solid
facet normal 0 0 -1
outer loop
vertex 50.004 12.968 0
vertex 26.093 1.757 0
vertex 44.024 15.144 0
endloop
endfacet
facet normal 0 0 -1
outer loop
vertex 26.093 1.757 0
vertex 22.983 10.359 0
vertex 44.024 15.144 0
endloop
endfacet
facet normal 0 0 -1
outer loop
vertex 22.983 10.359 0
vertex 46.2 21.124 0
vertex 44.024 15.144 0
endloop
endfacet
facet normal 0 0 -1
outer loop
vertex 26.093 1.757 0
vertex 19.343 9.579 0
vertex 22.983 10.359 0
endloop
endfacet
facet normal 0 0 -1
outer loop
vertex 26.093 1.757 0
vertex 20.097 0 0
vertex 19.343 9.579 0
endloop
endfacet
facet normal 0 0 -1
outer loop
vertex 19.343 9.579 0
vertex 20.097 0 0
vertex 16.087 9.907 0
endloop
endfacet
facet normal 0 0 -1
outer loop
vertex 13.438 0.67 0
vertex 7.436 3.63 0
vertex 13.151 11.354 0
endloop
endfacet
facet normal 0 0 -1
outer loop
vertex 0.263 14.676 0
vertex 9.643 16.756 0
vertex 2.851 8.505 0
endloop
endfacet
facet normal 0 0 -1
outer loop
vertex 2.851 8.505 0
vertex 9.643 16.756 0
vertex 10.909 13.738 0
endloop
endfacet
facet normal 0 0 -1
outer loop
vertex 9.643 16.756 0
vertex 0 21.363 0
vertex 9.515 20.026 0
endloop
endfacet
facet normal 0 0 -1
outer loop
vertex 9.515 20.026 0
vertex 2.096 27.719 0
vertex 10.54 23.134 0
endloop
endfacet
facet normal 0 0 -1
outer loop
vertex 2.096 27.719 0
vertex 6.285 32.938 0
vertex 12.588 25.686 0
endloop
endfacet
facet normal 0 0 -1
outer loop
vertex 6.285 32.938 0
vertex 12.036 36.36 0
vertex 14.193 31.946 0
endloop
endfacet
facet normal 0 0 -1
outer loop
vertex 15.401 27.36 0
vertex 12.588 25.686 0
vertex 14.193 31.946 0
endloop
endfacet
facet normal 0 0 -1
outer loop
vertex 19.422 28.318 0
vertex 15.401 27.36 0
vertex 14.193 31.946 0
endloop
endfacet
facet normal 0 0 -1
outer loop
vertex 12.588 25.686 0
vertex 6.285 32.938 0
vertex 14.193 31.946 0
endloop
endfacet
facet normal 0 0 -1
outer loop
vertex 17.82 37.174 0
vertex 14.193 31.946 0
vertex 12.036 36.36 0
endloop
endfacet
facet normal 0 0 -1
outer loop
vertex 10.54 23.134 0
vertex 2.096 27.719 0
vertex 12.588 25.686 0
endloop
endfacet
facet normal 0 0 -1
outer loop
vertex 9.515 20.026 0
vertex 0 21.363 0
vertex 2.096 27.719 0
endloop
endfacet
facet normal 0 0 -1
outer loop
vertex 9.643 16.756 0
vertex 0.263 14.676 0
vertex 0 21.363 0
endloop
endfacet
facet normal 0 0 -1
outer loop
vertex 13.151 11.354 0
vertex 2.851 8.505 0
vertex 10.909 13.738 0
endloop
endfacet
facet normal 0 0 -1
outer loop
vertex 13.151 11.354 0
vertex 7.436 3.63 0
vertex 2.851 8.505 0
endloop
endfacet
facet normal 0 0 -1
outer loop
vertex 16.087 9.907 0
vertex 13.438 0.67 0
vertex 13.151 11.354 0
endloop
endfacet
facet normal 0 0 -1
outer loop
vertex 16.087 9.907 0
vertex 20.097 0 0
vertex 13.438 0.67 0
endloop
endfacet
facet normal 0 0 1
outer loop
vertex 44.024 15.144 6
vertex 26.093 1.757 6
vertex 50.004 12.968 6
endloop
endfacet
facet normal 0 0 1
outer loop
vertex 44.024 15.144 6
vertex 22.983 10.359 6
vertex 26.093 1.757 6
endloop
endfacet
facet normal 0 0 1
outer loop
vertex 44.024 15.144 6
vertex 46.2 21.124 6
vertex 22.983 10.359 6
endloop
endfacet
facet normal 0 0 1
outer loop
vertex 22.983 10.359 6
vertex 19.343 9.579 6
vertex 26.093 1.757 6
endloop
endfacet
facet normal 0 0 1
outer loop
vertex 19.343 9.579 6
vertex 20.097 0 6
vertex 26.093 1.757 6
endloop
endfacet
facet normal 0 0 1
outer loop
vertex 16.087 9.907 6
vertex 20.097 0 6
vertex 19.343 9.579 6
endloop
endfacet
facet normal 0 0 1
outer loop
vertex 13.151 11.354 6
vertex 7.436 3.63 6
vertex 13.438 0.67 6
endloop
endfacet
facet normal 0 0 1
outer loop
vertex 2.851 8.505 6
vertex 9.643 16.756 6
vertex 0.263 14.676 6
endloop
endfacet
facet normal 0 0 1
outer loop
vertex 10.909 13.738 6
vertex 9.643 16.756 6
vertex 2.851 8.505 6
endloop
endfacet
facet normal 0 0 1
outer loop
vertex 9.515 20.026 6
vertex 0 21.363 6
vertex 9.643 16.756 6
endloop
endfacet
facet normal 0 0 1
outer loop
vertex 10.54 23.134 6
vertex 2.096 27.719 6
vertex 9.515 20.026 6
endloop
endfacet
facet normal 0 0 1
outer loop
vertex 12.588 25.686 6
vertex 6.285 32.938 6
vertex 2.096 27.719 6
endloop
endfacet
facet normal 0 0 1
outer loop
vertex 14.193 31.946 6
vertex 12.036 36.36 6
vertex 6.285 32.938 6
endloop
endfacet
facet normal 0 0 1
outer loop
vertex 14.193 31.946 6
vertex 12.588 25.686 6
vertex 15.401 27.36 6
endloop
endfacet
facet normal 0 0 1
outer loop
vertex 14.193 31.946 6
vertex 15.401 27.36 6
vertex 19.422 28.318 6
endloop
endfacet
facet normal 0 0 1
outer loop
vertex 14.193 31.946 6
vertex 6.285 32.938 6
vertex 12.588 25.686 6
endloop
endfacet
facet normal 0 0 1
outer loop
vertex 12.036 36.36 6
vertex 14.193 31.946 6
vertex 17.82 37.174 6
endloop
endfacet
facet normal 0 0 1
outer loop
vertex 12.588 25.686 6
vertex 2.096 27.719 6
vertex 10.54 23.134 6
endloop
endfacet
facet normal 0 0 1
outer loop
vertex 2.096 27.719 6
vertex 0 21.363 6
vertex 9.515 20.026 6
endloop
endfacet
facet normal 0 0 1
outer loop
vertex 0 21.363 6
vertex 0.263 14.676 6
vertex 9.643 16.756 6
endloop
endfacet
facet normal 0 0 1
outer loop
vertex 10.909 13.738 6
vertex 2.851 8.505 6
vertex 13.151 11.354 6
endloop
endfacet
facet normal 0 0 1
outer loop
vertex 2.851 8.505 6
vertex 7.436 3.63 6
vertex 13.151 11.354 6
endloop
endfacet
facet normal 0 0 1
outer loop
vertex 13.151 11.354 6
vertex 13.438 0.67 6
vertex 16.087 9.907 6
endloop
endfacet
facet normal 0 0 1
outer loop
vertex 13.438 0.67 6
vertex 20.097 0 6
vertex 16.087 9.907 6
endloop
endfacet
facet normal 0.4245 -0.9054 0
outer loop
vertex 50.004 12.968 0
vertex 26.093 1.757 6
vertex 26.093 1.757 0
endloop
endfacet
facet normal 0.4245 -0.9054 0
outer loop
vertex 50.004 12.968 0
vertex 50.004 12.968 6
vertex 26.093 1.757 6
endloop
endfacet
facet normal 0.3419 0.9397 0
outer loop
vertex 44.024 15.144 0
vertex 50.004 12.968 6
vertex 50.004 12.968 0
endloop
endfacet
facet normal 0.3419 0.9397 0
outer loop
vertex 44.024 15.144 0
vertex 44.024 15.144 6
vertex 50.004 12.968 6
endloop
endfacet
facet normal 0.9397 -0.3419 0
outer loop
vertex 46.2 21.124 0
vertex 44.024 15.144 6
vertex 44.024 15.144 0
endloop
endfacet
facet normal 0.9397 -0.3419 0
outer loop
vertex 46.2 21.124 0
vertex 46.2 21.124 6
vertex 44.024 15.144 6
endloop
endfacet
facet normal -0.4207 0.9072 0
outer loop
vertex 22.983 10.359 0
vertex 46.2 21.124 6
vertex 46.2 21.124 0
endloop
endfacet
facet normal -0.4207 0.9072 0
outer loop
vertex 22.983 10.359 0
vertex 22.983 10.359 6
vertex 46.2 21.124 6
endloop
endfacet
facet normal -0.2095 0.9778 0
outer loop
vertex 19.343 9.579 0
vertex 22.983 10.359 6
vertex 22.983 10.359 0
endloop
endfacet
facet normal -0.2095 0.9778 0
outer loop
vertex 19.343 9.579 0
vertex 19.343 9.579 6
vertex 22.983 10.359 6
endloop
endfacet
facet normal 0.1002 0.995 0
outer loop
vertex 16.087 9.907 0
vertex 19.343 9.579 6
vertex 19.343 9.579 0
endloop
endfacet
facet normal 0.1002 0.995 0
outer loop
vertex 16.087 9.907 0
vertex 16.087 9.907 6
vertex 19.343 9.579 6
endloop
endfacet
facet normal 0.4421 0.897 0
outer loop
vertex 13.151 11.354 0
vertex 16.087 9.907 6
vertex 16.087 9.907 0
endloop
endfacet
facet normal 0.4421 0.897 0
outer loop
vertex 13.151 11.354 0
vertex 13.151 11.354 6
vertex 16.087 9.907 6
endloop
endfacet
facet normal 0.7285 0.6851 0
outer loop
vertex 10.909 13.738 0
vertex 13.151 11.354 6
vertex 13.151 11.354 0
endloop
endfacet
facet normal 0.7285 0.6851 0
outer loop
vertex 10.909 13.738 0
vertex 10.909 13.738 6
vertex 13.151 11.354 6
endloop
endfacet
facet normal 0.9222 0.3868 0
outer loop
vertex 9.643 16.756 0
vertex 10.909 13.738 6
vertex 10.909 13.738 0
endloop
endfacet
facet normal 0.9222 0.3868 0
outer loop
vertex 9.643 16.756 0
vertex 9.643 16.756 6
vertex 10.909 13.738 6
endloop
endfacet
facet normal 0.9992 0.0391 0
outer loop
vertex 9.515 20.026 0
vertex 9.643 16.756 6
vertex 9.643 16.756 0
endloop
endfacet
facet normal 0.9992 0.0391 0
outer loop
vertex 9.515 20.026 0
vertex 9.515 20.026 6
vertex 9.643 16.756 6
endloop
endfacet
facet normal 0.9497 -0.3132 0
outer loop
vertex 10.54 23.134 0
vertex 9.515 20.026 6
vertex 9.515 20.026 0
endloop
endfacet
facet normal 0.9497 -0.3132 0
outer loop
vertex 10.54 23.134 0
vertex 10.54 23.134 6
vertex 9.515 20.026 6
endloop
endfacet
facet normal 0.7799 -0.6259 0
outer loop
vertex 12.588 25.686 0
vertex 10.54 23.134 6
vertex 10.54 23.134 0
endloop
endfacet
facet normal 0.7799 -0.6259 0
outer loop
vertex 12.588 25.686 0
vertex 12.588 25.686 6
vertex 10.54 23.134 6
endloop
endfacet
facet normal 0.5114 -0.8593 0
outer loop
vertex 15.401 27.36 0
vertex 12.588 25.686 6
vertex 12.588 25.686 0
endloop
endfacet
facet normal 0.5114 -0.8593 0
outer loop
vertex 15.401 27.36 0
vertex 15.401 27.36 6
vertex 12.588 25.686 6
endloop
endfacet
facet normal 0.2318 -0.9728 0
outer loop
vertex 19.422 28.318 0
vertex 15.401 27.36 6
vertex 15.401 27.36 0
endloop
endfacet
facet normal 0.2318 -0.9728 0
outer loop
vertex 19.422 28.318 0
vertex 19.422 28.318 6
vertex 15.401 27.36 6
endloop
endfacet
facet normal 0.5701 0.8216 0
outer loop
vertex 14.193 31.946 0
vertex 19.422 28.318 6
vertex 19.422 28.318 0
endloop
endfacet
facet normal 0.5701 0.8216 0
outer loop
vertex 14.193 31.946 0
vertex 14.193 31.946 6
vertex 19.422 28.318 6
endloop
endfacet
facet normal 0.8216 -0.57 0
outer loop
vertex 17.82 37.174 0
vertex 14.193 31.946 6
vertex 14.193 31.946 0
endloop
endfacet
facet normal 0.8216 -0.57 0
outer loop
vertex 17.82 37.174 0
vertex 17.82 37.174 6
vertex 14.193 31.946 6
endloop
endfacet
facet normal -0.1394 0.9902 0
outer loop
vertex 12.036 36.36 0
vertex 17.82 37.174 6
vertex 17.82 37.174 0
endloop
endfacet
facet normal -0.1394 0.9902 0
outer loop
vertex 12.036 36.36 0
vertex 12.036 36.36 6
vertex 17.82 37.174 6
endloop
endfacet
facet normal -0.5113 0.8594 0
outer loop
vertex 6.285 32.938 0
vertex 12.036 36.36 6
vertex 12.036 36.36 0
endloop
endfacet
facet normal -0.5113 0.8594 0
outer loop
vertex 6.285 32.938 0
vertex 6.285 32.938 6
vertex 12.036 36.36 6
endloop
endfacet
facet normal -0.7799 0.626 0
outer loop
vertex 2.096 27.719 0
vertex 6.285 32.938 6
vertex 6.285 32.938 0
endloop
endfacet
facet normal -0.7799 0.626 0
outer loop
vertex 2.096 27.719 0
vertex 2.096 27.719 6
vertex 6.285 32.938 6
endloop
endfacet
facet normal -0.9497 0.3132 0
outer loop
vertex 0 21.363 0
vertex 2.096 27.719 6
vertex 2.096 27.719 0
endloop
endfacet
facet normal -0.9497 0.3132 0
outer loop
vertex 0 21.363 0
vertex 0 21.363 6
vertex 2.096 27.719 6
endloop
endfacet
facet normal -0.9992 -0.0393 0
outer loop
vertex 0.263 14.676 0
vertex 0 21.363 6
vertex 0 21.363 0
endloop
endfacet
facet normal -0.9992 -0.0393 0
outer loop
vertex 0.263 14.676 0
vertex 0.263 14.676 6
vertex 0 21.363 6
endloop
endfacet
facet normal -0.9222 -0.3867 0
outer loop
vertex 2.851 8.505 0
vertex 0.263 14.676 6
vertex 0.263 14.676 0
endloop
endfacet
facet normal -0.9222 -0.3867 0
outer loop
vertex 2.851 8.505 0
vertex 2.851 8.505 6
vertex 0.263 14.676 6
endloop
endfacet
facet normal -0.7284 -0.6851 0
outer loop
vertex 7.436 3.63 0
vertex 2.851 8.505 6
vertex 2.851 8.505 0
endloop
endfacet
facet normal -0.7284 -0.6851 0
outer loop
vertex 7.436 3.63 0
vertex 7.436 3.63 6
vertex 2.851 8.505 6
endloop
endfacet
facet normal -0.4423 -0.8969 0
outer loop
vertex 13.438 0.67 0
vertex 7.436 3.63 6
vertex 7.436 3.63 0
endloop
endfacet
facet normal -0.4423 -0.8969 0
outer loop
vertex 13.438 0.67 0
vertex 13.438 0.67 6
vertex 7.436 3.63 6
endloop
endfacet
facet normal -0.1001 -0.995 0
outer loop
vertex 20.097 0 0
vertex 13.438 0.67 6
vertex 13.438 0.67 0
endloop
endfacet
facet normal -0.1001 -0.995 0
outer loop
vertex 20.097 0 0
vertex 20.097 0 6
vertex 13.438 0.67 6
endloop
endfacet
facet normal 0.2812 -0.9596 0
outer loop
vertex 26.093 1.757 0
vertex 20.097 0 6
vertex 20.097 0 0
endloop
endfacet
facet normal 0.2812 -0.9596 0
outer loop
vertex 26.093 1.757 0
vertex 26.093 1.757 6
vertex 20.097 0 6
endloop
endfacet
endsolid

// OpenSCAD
$fn = 32;

// ----------------------------------------------------------------------
// Hook plate: curl radius 14 mm over 205 degrees, 9 mm thick band
// ----------------------------------------------------------------------

// --- parameters (mm) ---
profile_height = 6;       // extrusion height
profile_points = 26;      // points of the closed outline

profile = [[14.193, 31.946], [17.82, 37.174], [12.036, 36.36], [6.285, 32.938], [2.096, 27.719], [0, 21.363], [0.263, 14.676], [2.851, 8.505], [7.436, 3.63], [13.438, 0.67], [20.097, 0], [26.093, 1.757], [50.004, 12.968], [44.024, 15.144], [46.2, 21.124], [22.983, 10.359], [19.343, 9.579], [16.087, 9.907], [13.151, 11.354], [10.909, 13.738], [9.643, 16.756], [9.515, 20.026], [10.54, 23.134], [12.588, 25.686], [15.401, 27.36], [19.422, 28.318]];  // single closed polygon, 26 points, counter clockwise

// --- the one profile operation ---
linear_extrude(height = profile_height) polygon(points = profile);
